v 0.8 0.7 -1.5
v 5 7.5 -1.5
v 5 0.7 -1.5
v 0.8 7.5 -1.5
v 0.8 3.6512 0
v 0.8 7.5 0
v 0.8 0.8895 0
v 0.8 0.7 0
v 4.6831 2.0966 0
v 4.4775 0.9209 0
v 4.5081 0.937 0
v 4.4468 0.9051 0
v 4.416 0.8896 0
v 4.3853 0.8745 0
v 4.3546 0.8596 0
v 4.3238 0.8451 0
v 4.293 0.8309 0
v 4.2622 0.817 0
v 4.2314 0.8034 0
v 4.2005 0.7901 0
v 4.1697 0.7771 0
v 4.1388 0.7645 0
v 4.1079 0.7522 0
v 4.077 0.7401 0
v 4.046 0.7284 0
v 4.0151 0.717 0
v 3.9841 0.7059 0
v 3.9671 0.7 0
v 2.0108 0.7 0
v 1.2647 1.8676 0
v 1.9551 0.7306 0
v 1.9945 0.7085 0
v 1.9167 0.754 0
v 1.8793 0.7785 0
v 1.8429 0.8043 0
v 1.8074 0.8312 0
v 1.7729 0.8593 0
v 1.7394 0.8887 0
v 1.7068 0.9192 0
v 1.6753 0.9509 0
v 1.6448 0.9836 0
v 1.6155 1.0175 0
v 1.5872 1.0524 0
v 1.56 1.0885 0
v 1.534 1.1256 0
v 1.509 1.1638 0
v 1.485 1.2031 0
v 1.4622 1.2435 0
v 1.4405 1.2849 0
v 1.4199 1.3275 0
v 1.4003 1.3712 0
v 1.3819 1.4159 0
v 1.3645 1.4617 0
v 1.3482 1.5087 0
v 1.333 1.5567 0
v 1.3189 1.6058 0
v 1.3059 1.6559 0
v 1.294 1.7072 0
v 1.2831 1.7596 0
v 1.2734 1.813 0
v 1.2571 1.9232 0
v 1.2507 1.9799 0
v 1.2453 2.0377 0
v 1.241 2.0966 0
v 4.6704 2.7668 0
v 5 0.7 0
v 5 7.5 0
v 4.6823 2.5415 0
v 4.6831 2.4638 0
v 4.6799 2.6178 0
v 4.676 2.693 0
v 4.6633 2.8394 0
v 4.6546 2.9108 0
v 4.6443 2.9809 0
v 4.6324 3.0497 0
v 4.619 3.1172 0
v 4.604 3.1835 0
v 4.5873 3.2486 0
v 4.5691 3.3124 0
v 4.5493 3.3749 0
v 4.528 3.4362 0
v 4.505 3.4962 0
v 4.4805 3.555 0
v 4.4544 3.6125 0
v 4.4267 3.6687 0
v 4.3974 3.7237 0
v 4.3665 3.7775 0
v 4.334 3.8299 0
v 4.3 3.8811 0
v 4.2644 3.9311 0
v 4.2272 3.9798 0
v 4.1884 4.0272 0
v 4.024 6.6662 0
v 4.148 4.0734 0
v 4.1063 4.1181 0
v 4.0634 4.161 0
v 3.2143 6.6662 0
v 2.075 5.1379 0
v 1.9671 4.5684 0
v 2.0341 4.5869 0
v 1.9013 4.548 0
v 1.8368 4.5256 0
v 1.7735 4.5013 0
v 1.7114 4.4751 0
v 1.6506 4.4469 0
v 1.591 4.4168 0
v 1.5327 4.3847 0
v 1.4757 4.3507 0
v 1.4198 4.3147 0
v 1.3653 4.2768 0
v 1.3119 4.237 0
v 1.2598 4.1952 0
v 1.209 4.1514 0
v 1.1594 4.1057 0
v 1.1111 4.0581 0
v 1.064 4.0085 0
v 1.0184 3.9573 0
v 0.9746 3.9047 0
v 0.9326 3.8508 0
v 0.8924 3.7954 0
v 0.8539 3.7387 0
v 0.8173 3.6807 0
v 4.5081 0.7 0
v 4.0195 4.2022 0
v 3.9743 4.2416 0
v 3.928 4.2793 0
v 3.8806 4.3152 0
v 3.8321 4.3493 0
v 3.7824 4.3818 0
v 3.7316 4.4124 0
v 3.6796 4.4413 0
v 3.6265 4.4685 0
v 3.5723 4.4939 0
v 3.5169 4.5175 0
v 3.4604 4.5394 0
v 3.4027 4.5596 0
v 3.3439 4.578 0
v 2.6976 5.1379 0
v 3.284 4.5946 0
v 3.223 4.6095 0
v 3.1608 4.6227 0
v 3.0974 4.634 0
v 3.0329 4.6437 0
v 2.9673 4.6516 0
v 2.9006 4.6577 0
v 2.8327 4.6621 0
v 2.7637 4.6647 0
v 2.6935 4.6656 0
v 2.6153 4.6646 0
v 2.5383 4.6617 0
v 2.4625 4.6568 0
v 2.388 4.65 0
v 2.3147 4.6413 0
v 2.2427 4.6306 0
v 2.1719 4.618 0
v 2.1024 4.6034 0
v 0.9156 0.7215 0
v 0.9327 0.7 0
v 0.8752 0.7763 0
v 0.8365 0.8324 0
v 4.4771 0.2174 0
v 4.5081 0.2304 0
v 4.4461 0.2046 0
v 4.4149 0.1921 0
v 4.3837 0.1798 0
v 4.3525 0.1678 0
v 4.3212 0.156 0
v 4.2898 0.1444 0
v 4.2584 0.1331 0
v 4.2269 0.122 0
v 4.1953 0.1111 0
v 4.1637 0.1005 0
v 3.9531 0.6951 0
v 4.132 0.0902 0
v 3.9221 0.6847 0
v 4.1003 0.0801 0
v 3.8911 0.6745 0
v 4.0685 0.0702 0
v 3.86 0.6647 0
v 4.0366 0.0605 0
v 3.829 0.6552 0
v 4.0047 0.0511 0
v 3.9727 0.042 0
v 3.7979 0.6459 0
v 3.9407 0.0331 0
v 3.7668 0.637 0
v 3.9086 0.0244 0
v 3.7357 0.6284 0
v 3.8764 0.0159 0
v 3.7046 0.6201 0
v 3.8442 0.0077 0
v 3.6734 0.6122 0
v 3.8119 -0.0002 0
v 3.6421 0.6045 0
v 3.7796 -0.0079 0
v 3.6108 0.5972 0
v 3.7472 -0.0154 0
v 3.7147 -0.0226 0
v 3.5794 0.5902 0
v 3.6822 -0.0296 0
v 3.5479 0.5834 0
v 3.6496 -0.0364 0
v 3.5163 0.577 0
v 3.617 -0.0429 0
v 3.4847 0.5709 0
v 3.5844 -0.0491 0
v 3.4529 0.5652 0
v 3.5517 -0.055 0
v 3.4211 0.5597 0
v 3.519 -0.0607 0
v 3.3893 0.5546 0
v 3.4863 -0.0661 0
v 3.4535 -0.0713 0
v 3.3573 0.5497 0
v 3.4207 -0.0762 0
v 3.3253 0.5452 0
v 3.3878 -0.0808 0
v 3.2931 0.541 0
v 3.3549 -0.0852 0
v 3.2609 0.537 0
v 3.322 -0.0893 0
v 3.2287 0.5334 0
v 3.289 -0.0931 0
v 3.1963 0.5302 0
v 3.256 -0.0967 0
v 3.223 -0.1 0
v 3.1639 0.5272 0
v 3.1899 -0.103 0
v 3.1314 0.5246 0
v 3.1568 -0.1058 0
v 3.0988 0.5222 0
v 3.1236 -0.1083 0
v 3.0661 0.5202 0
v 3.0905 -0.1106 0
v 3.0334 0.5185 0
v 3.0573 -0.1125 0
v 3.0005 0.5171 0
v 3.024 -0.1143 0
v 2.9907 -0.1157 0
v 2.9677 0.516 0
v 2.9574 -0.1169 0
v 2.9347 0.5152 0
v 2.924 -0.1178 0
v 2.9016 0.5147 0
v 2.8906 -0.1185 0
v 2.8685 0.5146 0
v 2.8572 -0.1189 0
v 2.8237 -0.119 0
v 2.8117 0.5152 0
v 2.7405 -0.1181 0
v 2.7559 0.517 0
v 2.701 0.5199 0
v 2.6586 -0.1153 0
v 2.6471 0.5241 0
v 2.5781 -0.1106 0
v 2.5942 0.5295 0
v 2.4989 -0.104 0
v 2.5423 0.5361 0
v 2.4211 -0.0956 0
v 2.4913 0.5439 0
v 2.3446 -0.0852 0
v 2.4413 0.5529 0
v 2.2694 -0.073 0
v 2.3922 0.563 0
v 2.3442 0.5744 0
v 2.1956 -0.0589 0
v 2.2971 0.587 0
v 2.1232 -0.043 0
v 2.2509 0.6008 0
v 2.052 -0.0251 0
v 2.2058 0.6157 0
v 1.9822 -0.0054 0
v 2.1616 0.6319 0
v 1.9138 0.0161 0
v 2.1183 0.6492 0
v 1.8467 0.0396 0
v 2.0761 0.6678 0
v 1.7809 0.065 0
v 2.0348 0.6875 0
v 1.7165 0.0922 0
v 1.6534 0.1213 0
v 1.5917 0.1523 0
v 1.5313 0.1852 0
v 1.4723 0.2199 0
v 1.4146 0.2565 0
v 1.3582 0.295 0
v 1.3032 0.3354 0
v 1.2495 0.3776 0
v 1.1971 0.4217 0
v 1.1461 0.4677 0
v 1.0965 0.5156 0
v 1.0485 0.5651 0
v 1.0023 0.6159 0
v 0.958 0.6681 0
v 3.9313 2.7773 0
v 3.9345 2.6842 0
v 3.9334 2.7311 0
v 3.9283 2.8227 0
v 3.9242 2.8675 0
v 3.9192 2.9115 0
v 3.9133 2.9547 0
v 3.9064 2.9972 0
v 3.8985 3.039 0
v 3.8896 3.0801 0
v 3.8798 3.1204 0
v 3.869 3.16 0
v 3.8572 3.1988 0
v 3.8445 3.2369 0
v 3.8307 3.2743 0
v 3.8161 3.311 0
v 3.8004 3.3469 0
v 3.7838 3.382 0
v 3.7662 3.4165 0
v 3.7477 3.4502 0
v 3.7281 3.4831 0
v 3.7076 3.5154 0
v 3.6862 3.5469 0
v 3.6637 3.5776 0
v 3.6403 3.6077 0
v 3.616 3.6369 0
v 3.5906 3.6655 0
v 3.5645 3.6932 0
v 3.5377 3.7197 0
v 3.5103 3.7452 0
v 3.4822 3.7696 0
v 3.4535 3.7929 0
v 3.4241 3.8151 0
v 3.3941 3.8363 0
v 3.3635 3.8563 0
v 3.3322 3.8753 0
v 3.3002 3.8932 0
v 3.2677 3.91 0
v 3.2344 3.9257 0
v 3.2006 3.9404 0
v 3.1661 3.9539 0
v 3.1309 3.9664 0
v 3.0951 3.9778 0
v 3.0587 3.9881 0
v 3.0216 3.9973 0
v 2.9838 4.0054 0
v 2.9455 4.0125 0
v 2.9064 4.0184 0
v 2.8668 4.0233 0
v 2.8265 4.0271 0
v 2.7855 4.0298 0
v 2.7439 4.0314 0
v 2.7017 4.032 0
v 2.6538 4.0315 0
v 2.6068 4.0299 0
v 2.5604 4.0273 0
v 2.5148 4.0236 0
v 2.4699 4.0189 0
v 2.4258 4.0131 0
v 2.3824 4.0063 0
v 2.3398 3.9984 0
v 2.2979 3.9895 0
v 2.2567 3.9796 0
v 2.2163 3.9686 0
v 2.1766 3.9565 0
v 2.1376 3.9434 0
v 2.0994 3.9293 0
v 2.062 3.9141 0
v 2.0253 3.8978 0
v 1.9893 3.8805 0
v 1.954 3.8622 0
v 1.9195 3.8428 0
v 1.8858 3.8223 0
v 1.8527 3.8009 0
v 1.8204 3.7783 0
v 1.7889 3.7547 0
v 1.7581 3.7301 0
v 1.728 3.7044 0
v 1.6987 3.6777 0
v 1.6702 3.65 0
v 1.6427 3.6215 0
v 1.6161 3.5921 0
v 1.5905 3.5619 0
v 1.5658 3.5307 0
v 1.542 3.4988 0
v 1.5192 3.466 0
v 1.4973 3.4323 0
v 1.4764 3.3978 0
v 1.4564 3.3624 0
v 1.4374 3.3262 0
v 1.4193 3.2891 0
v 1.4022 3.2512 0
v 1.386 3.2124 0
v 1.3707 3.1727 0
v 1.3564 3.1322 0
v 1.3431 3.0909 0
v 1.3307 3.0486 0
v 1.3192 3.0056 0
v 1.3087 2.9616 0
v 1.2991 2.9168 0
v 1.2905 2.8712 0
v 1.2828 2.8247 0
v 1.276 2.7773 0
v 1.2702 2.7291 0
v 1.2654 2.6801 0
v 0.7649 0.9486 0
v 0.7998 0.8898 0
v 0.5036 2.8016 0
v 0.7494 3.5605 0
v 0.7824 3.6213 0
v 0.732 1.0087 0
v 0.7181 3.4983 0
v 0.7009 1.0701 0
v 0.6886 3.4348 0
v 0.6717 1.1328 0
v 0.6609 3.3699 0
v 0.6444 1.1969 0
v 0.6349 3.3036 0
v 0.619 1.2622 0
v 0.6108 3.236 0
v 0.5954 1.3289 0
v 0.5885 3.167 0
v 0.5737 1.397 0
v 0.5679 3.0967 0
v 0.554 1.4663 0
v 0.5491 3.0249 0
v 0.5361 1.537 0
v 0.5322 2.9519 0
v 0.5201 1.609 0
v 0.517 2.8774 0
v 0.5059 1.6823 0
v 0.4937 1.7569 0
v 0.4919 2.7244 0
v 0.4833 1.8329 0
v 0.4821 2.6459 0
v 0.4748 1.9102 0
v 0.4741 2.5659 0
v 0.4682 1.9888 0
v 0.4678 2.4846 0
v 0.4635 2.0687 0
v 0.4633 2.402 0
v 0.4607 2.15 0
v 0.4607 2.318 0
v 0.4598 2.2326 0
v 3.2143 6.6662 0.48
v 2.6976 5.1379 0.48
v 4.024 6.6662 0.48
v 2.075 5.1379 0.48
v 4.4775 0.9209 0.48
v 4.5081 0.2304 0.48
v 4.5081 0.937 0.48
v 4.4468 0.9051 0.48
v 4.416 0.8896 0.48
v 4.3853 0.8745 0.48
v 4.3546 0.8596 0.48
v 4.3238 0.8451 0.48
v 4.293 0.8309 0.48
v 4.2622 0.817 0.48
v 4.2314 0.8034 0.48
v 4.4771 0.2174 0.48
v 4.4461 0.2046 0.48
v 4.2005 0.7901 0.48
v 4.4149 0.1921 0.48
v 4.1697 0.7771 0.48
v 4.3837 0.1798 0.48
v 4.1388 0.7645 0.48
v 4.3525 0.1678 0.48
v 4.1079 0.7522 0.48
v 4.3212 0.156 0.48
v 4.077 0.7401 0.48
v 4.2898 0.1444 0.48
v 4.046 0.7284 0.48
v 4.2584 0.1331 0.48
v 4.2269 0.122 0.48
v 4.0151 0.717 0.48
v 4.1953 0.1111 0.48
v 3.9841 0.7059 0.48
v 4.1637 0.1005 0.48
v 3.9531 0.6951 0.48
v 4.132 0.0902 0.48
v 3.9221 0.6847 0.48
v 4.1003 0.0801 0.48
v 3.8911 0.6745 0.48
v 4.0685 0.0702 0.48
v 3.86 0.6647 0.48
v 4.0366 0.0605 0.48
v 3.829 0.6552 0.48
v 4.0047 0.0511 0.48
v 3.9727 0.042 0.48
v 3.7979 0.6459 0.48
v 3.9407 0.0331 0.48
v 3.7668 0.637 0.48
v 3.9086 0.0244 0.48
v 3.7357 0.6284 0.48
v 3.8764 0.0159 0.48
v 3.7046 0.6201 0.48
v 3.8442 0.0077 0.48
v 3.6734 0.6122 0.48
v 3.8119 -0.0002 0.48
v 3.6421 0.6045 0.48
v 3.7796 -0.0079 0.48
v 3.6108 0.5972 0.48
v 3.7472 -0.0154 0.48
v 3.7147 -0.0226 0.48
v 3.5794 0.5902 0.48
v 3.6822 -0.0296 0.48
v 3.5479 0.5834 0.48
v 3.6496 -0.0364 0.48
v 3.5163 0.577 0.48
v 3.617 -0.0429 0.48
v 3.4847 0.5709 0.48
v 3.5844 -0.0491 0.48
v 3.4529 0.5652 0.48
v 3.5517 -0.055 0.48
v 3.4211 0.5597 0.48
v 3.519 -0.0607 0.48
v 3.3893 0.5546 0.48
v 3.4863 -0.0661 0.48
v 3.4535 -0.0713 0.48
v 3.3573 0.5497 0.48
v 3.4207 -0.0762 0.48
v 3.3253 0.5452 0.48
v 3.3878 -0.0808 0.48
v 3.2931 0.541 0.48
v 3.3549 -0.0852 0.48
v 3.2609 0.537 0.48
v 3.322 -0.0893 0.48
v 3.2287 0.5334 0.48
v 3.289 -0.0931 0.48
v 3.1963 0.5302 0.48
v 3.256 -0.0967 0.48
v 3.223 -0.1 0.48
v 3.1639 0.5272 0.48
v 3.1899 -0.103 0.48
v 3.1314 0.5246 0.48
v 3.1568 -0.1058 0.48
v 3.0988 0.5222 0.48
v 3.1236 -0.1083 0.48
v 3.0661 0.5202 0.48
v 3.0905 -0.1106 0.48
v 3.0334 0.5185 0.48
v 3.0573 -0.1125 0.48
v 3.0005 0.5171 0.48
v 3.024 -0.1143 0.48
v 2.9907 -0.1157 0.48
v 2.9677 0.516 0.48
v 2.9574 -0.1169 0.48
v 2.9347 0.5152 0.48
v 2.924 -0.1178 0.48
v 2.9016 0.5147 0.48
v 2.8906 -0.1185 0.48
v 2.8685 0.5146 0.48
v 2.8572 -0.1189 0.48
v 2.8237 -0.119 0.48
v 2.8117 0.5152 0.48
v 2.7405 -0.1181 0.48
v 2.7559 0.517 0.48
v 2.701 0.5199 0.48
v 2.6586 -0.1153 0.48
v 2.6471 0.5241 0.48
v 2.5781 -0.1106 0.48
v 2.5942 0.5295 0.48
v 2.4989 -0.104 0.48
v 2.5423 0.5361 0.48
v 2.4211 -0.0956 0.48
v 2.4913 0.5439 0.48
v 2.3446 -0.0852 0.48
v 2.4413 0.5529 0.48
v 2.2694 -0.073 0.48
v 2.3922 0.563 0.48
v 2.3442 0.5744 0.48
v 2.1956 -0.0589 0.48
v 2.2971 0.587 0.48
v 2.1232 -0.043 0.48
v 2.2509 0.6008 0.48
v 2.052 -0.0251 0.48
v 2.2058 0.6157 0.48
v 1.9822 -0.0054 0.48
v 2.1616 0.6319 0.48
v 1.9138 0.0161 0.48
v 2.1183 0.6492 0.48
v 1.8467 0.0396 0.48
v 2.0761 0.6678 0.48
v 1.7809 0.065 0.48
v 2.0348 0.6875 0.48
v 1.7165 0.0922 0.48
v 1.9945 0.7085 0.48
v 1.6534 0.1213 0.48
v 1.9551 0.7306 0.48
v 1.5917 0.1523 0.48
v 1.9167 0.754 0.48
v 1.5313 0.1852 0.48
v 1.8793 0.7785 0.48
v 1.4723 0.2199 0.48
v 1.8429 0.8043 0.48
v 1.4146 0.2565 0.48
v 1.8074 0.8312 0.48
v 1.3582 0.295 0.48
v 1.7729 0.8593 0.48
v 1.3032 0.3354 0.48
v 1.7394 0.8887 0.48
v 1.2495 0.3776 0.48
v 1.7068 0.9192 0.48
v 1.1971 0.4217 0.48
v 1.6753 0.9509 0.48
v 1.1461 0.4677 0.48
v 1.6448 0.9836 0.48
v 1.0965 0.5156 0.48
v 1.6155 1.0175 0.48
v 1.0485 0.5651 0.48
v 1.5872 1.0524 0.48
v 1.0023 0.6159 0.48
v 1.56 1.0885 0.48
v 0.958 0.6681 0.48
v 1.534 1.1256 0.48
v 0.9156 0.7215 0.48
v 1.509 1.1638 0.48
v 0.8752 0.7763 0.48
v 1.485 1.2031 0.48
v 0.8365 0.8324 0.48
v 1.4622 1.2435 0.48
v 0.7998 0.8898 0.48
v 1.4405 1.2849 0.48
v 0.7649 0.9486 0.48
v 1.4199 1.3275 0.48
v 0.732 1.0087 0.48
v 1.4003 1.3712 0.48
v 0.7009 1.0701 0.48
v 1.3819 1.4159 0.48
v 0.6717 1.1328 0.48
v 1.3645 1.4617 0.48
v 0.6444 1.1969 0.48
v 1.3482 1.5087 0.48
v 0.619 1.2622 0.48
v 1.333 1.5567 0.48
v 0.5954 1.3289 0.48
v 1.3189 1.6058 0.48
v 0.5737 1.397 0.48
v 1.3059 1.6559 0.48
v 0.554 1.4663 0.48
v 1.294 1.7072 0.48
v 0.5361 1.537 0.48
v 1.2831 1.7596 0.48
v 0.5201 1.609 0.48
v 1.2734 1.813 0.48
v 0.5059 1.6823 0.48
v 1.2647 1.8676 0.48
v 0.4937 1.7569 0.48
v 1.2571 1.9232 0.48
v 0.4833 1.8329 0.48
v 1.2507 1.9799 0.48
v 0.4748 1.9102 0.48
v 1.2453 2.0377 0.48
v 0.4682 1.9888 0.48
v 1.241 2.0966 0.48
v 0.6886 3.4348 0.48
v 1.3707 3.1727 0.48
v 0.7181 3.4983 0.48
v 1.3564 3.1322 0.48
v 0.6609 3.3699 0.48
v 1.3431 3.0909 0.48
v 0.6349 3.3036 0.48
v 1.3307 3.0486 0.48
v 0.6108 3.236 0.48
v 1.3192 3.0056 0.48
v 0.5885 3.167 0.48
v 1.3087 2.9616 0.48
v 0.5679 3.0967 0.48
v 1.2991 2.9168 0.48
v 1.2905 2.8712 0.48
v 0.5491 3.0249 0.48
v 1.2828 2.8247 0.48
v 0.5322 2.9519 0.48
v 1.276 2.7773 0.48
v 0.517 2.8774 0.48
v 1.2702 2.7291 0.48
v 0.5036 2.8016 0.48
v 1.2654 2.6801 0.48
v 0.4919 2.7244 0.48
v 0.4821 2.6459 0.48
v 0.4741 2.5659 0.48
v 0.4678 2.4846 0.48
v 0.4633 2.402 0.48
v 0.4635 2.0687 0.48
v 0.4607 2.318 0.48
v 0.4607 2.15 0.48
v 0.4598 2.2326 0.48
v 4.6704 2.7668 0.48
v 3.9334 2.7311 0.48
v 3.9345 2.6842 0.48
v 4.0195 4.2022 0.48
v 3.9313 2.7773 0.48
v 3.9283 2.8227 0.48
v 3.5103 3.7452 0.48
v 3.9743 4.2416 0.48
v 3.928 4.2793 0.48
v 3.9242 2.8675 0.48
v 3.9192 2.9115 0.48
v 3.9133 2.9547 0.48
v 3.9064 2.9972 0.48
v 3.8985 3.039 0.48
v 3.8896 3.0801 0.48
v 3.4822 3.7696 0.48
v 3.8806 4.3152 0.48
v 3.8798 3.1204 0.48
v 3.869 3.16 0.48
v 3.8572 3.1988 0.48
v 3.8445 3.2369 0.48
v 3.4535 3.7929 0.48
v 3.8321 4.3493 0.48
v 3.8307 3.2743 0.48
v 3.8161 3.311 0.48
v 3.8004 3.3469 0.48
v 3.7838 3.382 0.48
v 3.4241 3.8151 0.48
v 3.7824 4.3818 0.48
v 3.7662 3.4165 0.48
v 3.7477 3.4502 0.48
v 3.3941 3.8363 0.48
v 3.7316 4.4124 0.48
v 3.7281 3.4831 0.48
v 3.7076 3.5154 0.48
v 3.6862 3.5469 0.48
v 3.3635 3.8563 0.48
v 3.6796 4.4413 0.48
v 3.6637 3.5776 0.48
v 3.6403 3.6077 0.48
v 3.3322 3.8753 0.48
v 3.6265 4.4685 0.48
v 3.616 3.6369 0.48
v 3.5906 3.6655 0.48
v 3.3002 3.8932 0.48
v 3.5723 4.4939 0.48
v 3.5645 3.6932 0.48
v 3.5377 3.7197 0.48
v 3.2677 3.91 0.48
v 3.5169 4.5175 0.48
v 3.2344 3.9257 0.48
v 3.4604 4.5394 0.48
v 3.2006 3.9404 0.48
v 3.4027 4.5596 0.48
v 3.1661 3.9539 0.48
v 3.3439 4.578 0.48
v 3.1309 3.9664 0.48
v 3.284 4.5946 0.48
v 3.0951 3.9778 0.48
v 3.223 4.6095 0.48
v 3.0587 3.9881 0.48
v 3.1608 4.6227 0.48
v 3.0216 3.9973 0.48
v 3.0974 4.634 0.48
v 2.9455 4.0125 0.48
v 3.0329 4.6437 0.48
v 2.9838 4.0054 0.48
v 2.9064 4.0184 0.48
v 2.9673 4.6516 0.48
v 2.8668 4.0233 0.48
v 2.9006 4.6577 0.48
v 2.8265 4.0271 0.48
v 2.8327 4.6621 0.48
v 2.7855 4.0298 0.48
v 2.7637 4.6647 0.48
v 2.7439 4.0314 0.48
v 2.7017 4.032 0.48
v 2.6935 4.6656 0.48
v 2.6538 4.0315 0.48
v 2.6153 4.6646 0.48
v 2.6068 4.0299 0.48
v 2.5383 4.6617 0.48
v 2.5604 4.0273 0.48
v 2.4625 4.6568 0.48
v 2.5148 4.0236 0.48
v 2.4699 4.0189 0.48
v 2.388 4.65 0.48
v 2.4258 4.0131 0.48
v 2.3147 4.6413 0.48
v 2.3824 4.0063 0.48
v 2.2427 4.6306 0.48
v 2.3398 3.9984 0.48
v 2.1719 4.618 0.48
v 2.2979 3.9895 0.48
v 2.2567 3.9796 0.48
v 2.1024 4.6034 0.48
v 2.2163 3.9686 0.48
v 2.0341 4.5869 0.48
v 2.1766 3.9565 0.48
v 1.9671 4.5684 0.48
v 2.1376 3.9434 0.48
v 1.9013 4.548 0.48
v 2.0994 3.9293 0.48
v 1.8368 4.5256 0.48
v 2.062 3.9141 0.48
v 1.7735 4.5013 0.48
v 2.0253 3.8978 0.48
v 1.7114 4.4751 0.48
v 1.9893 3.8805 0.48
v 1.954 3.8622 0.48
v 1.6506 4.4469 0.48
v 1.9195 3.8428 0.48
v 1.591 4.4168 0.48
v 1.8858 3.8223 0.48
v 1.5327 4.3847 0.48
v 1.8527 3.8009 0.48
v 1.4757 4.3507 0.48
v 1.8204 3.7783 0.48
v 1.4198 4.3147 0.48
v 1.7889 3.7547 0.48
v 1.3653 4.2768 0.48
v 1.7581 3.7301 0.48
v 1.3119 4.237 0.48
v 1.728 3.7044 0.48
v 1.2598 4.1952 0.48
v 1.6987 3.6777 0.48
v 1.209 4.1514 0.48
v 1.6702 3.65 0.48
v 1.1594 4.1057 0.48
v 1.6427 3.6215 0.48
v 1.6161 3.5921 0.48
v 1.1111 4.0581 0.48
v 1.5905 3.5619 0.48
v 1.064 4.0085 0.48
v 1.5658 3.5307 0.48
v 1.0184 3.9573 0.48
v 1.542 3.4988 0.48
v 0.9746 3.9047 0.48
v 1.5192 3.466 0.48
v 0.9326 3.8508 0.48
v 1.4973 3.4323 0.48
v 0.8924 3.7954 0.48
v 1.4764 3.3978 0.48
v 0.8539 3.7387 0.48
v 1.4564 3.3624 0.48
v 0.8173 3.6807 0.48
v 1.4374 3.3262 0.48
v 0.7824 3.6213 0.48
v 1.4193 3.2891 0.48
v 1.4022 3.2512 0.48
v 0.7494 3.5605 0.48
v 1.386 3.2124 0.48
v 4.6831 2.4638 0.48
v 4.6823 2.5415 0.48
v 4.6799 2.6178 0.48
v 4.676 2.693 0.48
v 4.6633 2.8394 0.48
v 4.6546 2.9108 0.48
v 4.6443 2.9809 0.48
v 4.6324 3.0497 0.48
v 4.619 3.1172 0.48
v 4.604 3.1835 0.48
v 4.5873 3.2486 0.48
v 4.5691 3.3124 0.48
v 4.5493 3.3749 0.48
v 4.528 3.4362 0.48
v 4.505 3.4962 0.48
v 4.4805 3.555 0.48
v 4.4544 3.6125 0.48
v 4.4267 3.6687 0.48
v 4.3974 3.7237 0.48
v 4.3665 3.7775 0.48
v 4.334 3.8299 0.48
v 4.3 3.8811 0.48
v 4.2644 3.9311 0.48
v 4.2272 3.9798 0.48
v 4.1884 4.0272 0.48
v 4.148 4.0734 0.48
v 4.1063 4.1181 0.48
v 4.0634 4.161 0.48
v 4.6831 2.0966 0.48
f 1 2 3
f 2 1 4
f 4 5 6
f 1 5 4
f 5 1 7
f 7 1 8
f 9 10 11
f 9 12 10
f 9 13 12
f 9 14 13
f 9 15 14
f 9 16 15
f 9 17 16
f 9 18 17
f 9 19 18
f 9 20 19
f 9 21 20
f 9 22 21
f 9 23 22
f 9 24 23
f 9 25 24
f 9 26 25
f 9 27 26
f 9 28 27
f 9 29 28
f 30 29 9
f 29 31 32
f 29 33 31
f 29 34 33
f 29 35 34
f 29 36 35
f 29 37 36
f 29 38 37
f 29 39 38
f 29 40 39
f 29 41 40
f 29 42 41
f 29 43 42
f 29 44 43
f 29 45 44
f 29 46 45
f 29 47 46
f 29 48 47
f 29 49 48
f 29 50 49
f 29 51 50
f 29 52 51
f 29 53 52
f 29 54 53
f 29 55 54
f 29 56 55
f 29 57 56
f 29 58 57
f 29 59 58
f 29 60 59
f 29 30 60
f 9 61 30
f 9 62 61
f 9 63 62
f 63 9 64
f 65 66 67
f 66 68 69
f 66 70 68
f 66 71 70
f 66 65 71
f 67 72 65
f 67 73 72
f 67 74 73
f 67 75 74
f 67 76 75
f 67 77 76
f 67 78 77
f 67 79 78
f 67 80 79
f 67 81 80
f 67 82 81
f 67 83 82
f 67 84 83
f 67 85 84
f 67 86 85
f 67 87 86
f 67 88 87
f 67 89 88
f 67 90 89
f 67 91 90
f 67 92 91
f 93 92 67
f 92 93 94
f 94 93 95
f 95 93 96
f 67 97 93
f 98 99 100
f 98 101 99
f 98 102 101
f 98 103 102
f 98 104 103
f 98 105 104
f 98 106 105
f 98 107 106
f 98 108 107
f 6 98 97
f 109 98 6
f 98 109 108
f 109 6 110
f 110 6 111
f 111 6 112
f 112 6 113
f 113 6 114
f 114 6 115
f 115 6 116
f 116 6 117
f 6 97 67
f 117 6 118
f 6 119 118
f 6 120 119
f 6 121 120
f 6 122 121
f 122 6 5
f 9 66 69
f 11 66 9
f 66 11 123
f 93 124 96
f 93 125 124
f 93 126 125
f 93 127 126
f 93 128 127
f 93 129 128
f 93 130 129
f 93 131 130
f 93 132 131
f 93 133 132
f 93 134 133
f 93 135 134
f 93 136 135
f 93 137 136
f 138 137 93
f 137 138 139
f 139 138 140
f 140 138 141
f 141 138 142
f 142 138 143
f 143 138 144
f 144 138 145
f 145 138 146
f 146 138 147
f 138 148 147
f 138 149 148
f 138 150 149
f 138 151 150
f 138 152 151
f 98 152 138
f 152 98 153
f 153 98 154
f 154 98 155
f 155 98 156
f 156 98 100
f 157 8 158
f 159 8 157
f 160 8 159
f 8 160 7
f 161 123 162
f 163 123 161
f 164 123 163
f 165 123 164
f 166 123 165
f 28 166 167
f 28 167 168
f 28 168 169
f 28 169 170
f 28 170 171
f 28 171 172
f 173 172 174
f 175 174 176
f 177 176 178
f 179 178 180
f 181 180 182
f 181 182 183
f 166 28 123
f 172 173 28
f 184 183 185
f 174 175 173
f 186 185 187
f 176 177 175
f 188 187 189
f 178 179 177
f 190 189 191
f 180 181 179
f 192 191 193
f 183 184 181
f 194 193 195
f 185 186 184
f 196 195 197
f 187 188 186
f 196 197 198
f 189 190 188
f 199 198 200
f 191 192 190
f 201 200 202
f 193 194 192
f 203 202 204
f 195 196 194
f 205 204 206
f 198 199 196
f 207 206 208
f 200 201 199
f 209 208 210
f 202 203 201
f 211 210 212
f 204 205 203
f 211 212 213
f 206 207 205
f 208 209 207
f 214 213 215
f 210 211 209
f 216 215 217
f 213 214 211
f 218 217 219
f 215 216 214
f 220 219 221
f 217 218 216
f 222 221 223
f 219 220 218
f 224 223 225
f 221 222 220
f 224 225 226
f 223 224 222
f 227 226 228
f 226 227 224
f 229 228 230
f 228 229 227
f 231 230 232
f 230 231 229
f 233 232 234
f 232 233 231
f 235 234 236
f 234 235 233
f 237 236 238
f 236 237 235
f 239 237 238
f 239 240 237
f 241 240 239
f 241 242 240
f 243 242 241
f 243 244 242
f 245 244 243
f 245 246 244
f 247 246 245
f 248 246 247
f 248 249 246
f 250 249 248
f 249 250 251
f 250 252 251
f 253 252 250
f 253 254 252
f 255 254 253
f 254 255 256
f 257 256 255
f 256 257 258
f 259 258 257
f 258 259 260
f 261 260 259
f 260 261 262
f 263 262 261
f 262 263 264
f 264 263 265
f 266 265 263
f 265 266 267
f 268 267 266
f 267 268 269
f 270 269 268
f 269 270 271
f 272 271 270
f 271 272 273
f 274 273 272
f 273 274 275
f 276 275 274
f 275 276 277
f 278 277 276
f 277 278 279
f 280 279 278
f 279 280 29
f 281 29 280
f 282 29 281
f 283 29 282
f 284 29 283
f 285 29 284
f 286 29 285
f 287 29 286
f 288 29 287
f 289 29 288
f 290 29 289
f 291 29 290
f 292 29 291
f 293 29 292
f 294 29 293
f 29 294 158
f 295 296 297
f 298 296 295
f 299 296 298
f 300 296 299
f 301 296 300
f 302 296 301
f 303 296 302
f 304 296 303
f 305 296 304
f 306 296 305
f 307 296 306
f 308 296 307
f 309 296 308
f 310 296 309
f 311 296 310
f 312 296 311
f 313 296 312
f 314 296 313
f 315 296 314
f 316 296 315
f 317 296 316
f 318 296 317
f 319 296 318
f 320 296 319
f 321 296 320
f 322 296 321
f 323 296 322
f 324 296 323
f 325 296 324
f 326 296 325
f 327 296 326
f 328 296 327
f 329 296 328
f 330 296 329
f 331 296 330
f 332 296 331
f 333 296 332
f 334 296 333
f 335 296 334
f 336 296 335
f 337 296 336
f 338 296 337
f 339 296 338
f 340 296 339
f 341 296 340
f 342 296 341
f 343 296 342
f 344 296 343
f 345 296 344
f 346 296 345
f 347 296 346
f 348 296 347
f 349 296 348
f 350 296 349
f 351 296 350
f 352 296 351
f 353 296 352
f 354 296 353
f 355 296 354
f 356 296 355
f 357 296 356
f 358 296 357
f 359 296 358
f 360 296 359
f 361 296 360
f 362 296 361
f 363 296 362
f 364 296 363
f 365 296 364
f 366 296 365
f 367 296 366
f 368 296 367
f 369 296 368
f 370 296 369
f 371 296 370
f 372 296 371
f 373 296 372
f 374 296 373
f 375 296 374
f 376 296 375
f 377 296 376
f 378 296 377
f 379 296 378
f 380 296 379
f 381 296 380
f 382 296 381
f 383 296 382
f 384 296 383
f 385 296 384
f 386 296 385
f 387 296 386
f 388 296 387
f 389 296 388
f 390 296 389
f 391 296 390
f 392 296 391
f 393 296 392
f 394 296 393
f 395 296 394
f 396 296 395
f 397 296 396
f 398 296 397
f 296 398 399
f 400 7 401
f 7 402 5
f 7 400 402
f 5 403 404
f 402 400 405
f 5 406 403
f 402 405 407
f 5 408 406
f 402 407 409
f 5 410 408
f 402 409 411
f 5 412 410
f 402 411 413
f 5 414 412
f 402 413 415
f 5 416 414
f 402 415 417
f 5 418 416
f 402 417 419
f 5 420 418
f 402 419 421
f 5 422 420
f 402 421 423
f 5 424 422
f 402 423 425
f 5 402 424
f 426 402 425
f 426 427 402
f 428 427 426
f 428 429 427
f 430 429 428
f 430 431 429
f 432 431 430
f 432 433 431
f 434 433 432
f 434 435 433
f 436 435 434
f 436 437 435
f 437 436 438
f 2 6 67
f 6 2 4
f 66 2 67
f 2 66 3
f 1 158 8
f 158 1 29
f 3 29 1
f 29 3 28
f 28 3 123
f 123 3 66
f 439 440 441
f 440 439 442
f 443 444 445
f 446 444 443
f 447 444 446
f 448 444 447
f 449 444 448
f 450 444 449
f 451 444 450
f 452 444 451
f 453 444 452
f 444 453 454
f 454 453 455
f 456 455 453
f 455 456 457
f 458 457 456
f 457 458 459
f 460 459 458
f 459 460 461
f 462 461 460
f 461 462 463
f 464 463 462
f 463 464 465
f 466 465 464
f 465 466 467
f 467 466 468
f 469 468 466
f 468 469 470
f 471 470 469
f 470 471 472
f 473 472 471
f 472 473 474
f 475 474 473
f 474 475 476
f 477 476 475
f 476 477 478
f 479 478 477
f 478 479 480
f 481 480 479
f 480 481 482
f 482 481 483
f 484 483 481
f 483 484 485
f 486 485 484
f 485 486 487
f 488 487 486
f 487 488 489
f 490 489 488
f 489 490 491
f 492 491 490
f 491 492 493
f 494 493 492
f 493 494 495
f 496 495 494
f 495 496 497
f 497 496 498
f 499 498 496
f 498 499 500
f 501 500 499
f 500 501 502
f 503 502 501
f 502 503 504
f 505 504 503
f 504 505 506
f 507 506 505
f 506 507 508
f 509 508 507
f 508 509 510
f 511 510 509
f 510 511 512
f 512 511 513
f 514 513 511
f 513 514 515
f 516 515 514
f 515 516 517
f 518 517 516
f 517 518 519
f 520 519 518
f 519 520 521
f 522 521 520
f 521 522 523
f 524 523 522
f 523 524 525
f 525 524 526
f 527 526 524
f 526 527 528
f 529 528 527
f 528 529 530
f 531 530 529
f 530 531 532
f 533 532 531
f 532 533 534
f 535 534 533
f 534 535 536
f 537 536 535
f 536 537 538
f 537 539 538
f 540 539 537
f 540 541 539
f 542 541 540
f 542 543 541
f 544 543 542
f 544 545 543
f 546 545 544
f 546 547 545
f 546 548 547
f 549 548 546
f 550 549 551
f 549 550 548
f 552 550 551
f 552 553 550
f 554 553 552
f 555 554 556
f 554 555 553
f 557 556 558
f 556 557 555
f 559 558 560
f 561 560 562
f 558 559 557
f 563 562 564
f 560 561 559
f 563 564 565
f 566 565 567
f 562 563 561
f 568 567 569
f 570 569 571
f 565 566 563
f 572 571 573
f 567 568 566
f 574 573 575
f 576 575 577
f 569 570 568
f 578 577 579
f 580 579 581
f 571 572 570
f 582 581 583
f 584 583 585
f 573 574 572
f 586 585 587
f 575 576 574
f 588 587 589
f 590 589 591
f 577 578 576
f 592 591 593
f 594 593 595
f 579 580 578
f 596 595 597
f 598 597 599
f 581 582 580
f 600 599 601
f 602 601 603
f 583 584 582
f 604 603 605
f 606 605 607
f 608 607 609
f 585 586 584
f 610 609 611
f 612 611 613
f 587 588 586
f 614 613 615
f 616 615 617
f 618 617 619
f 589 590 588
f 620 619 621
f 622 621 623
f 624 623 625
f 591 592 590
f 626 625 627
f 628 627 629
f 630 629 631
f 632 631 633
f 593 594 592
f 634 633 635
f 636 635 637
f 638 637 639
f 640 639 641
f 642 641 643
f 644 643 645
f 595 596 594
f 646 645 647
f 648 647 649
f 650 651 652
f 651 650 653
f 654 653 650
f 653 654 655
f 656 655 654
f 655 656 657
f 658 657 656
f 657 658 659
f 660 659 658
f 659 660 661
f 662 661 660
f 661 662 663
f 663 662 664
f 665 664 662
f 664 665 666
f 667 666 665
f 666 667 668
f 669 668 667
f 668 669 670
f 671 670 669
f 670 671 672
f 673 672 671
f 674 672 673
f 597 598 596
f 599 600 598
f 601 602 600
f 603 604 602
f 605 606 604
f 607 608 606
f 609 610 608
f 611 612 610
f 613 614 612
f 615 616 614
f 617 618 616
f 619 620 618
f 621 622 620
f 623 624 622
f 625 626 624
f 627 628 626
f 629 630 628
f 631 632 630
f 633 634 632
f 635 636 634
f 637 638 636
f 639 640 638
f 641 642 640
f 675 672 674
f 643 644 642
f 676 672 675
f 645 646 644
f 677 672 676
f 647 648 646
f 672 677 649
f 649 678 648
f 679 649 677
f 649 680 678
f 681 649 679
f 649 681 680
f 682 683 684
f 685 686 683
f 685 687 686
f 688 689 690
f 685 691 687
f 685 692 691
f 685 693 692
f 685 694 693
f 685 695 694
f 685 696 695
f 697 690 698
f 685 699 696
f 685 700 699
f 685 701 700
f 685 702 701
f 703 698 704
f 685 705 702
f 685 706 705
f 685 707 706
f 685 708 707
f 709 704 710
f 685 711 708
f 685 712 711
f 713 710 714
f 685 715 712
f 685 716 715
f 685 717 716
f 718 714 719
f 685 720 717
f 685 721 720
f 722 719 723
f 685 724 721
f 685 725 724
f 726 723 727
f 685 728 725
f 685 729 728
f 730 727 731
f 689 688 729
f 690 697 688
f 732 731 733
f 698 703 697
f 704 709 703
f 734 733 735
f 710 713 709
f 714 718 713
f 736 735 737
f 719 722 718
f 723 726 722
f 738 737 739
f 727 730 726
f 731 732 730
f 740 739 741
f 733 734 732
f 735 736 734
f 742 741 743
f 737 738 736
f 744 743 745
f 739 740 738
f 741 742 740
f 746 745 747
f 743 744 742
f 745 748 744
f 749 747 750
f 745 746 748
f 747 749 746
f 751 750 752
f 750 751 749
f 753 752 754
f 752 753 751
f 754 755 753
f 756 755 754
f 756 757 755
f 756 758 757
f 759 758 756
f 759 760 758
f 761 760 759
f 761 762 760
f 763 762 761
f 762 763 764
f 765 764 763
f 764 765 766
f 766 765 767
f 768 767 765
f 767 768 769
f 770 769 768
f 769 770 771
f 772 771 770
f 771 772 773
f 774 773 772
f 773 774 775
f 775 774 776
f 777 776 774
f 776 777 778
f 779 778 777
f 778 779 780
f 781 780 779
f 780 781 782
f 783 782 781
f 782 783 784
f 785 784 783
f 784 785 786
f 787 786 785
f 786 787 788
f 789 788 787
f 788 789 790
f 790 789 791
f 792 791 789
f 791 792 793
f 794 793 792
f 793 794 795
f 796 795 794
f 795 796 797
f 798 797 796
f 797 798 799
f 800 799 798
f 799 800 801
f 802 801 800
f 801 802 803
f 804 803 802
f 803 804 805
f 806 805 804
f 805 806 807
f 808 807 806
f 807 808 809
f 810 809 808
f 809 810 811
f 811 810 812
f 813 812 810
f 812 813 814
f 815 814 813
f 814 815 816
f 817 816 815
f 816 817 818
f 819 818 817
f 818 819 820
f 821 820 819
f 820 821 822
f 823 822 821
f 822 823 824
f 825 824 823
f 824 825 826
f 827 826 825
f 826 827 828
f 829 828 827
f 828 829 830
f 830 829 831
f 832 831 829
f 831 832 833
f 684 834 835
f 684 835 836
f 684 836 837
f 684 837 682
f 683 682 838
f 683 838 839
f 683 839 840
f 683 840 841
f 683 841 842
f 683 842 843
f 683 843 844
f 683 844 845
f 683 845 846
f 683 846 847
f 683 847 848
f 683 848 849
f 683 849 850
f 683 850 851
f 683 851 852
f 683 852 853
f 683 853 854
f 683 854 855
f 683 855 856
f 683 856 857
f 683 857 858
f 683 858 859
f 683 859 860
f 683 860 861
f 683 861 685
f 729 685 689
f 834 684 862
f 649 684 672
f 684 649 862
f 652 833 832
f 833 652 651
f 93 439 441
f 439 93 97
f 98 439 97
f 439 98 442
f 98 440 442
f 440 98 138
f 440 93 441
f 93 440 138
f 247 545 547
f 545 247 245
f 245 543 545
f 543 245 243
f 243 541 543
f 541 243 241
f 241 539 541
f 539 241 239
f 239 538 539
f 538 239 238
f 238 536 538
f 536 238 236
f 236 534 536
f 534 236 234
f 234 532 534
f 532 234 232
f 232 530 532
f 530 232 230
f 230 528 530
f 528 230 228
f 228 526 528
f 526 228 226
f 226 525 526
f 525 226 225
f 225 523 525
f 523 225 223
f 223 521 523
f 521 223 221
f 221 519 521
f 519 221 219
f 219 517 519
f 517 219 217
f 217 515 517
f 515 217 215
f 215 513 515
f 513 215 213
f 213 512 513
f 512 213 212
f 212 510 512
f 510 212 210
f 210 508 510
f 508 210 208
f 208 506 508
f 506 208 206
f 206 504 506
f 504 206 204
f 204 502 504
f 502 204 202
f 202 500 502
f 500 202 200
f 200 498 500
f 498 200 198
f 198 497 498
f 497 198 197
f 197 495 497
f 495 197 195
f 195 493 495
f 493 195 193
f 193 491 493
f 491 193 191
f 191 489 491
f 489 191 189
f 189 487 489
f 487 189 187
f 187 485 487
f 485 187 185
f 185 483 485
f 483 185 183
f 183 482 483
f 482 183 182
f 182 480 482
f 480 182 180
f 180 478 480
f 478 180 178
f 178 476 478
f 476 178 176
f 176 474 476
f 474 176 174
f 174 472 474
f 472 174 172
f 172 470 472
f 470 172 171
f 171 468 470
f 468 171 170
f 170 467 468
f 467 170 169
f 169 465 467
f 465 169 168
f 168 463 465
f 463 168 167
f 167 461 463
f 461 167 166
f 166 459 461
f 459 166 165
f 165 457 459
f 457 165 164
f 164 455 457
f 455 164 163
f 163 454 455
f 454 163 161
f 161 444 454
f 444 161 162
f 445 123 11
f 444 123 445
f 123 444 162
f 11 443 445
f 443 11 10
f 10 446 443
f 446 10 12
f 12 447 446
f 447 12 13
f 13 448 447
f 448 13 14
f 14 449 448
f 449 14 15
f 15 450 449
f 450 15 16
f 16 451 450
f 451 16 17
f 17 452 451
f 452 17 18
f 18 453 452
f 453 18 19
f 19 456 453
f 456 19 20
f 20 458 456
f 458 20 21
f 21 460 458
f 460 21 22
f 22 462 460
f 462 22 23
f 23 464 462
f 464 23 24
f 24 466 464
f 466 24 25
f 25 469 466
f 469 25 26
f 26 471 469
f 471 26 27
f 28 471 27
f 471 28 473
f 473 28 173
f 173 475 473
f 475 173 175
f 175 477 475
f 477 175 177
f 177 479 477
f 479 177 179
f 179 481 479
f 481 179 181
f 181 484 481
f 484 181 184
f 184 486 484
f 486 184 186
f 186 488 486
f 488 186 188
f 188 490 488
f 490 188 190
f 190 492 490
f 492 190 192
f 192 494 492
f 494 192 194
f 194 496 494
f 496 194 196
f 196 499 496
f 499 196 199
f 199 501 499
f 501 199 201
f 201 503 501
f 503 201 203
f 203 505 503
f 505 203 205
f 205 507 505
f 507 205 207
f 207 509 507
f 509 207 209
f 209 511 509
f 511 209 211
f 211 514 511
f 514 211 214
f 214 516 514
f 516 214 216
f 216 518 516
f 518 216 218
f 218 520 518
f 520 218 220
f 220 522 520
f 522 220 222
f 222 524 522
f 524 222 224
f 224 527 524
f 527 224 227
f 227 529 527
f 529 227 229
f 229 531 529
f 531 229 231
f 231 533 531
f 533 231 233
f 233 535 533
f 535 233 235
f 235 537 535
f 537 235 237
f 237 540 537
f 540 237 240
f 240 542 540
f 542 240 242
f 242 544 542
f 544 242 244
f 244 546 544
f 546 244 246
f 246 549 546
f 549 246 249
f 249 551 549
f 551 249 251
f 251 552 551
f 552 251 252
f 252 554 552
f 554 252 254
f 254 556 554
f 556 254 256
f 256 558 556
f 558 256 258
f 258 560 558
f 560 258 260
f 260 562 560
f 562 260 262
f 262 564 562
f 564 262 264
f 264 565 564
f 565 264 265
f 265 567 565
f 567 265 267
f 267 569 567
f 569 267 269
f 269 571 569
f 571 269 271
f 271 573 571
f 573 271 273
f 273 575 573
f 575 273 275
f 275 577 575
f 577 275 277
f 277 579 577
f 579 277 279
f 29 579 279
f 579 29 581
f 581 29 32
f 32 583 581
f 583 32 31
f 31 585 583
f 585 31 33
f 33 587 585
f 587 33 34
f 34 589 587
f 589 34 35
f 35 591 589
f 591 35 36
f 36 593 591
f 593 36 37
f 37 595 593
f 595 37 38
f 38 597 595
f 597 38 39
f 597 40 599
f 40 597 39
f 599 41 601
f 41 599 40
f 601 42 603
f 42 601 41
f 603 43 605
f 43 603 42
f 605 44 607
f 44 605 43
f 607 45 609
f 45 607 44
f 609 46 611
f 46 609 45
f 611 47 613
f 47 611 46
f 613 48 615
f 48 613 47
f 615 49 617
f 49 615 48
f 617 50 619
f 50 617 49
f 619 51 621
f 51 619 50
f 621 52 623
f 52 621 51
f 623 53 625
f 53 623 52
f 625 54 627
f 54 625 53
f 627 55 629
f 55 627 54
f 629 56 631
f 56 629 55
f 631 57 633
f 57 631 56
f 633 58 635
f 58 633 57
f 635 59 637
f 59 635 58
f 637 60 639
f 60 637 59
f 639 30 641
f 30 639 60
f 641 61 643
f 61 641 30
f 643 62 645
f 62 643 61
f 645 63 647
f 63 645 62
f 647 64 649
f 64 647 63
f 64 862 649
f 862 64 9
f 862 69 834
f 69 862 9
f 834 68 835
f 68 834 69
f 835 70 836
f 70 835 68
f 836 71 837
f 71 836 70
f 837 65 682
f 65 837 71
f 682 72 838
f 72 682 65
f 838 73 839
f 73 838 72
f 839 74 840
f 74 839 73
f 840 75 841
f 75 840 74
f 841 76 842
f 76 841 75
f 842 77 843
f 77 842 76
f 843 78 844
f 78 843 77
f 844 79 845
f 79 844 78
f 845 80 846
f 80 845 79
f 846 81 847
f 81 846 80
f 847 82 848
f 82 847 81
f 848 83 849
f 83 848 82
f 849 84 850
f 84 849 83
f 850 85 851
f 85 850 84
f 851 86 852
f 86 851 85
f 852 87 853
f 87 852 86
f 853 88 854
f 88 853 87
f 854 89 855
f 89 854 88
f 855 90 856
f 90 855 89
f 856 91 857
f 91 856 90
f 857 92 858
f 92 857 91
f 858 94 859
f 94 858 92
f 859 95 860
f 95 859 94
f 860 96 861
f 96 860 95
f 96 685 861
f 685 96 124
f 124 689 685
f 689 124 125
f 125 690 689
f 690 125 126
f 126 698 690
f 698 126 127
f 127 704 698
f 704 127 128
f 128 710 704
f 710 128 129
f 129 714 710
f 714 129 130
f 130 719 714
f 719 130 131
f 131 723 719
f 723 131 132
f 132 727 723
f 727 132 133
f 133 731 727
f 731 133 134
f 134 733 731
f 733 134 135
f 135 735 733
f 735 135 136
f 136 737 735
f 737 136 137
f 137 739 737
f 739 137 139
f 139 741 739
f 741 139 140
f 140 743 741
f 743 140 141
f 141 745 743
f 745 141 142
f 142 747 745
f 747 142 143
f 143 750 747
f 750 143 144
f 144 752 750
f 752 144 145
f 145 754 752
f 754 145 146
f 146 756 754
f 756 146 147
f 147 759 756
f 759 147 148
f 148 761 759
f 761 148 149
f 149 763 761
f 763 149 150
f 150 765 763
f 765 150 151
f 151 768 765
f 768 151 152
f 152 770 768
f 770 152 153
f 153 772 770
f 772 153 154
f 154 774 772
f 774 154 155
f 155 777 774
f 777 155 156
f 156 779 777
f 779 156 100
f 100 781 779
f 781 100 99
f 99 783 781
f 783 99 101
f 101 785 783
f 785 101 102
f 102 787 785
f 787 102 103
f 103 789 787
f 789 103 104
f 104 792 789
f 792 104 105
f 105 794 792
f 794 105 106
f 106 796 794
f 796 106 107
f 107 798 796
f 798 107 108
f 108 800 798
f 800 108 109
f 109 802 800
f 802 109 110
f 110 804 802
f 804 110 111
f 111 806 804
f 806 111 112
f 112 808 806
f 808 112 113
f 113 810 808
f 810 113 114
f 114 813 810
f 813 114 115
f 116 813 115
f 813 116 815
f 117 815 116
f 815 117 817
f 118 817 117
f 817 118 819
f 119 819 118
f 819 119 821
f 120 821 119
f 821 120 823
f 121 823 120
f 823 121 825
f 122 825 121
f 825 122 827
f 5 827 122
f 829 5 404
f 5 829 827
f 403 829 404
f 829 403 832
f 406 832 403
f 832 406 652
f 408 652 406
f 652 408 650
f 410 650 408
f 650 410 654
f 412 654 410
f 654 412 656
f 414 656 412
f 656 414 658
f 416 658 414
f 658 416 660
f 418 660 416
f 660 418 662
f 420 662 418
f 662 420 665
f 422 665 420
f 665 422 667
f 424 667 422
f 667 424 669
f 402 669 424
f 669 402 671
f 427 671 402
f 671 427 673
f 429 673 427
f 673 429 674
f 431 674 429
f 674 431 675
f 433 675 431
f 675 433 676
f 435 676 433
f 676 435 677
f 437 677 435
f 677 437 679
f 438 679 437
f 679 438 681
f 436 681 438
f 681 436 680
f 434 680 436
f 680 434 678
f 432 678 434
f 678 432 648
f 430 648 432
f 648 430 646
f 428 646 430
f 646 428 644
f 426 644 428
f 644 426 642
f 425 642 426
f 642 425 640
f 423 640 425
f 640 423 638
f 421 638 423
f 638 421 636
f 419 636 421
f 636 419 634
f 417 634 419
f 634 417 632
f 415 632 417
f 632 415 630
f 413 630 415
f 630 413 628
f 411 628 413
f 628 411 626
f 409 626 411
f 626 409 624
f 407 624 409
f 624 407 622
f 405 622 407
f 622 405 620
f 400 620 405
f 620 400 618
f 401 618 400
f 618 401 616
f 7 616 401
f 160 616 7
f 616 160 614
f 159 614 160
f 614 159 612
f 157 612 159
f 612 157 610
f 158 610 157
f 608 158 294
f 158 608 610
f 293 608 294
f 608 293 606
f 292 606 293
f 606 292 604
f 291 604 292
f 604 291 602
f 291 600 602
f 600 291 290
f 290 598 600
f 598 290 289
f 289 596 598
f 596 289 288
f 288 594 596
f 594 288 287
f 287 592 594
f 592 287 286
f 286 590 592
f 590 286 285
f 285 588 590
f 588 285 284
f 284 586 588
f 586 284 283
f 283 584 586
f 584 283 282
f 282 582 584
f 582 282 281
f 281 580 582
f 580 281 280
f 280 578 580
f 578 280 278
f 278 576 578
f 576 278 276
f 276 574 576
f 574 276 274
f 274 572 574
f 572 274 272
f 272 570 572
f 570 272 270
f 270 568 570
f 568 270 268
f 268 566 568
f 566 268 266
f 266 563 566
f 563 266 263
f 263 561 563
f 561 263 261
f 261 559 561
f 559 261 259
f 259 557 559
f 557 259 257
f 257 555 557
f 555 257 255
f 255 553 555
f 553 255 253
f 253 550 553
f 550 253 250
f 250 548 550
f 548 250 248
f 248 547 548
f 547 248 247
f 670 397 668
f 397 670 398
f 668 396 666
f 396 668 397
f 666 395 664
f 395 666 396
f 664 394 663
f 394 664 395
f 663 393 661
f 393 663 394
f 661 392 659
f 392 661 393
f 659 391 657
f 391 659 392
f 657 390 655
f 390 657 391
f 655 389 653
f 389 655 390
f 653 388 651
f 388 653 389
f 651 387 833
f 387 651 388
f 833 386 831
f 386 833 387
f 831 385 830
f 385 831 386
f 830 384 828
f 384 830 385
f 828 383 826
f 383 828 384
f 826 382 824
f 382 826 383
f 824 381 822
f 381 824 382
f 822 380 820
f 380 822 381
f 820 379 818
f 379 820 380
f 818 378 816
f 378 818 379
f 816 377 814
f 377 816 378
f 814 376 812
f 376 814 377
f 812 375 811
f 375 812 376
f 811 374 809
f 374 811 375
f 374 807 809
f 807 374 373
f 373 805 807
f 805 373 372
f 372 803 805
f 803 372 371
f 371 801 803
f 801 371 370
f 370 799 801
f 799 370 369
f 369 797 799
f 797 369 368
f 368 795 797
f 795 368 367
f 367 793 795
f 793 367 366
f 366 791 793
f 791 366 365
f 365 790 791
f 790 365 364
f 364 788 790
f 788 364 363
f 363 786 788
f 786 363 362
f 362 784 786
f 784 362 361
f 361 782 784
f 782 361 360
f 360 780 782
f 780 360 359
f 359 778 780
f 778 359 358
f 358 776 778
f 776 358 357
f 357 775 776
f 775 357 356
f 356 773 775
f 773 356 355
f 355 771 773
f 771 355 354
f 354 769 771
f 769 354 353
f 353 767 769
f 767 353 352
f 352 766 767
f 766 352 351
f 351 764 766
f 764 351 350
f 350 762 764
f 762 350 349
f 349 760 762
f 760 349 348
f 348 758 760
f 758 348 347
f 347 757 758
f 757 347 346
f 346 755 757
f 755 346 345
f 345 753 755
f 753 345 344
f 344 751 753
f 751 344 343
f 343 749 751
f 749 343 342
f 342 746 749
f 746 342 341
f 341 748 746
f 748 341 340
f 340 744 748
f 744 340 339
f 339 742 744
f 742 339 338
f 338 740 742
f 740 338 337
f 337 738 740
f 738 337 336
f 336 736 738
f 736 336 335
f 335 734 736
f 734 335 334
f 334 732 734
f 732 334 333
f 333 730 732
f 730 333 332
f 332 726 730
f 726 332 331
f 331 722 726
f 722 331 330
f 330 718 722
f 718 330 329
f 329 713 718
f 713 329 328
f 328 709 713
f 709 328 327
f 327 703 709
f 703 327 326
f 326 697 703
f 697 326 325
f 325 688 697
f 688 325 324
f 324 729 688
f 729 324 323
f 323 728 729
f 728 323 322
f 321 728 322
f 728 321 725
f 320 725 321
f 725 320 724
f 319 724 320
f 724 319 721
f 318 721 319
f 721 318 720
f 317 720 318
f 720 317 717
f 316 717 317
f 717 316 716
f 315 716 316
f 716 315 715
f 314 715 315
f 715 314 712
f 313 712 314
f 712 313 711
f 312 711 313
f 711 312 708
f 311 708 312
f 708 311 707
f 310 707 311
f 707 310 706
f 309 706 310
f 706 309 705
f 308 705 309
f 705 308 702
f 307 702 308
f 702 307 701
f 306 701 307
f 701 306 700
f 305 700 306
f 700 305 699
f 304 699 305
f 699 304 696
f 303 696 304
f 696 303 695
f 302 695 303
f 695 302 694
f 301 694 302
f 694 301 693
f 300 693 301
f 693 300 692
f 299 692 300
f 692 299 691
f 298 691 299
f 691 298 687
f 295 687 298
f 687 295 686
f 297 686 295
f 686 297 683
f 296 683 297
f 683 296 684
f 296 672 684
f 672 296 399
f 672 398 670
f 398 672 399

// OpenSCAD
// file: common.scad
// Parameters
// Al units are mm
base_plate_width = 80;
base_plate_heigth = 60;
base_plate_thickness = 1.5;
base_plate_rounding = 3;
base_plate_margin = 1;

shape_thickness = 1; // Thickness of the base circle
shape_addition_thickness = 0.5; // Thickness of shapes additions

// The braille font is taken from : http://www.fontspace.com/philing/braille-normal
braille_thickness = 0.48; // Heigth of the extrusion of the braille font
braille_font_size = 6; // Font size to get normal braille cell size


$fn=200;


// Make "dashed" shapes
module dashed()
{
    intersection()
    {
        children();
        for(n = [-100 : 100])
        {
            translate([n,0,0]) square([ 0.5, 1000 ] );
        }
    }
}
// main file
include <common.scad>


// Check Braille font size : should display 6 dots in a rectangle which fits exactly font top view
color ("lightblue")
translate ( [2.9, 4.1, -base_plate_thickness] )
linear_extrude( height = base_plate_thickness )
square( [ 4.2, 6.8 ], center = true );

// Braille top_caption
color ("green")
translate ( [ 0 , 0, 0] )
linear_extrude( height = braille_thickness )
text( text = "é" , font="Braille Normal:style=Regular", size = braille_font_size);
